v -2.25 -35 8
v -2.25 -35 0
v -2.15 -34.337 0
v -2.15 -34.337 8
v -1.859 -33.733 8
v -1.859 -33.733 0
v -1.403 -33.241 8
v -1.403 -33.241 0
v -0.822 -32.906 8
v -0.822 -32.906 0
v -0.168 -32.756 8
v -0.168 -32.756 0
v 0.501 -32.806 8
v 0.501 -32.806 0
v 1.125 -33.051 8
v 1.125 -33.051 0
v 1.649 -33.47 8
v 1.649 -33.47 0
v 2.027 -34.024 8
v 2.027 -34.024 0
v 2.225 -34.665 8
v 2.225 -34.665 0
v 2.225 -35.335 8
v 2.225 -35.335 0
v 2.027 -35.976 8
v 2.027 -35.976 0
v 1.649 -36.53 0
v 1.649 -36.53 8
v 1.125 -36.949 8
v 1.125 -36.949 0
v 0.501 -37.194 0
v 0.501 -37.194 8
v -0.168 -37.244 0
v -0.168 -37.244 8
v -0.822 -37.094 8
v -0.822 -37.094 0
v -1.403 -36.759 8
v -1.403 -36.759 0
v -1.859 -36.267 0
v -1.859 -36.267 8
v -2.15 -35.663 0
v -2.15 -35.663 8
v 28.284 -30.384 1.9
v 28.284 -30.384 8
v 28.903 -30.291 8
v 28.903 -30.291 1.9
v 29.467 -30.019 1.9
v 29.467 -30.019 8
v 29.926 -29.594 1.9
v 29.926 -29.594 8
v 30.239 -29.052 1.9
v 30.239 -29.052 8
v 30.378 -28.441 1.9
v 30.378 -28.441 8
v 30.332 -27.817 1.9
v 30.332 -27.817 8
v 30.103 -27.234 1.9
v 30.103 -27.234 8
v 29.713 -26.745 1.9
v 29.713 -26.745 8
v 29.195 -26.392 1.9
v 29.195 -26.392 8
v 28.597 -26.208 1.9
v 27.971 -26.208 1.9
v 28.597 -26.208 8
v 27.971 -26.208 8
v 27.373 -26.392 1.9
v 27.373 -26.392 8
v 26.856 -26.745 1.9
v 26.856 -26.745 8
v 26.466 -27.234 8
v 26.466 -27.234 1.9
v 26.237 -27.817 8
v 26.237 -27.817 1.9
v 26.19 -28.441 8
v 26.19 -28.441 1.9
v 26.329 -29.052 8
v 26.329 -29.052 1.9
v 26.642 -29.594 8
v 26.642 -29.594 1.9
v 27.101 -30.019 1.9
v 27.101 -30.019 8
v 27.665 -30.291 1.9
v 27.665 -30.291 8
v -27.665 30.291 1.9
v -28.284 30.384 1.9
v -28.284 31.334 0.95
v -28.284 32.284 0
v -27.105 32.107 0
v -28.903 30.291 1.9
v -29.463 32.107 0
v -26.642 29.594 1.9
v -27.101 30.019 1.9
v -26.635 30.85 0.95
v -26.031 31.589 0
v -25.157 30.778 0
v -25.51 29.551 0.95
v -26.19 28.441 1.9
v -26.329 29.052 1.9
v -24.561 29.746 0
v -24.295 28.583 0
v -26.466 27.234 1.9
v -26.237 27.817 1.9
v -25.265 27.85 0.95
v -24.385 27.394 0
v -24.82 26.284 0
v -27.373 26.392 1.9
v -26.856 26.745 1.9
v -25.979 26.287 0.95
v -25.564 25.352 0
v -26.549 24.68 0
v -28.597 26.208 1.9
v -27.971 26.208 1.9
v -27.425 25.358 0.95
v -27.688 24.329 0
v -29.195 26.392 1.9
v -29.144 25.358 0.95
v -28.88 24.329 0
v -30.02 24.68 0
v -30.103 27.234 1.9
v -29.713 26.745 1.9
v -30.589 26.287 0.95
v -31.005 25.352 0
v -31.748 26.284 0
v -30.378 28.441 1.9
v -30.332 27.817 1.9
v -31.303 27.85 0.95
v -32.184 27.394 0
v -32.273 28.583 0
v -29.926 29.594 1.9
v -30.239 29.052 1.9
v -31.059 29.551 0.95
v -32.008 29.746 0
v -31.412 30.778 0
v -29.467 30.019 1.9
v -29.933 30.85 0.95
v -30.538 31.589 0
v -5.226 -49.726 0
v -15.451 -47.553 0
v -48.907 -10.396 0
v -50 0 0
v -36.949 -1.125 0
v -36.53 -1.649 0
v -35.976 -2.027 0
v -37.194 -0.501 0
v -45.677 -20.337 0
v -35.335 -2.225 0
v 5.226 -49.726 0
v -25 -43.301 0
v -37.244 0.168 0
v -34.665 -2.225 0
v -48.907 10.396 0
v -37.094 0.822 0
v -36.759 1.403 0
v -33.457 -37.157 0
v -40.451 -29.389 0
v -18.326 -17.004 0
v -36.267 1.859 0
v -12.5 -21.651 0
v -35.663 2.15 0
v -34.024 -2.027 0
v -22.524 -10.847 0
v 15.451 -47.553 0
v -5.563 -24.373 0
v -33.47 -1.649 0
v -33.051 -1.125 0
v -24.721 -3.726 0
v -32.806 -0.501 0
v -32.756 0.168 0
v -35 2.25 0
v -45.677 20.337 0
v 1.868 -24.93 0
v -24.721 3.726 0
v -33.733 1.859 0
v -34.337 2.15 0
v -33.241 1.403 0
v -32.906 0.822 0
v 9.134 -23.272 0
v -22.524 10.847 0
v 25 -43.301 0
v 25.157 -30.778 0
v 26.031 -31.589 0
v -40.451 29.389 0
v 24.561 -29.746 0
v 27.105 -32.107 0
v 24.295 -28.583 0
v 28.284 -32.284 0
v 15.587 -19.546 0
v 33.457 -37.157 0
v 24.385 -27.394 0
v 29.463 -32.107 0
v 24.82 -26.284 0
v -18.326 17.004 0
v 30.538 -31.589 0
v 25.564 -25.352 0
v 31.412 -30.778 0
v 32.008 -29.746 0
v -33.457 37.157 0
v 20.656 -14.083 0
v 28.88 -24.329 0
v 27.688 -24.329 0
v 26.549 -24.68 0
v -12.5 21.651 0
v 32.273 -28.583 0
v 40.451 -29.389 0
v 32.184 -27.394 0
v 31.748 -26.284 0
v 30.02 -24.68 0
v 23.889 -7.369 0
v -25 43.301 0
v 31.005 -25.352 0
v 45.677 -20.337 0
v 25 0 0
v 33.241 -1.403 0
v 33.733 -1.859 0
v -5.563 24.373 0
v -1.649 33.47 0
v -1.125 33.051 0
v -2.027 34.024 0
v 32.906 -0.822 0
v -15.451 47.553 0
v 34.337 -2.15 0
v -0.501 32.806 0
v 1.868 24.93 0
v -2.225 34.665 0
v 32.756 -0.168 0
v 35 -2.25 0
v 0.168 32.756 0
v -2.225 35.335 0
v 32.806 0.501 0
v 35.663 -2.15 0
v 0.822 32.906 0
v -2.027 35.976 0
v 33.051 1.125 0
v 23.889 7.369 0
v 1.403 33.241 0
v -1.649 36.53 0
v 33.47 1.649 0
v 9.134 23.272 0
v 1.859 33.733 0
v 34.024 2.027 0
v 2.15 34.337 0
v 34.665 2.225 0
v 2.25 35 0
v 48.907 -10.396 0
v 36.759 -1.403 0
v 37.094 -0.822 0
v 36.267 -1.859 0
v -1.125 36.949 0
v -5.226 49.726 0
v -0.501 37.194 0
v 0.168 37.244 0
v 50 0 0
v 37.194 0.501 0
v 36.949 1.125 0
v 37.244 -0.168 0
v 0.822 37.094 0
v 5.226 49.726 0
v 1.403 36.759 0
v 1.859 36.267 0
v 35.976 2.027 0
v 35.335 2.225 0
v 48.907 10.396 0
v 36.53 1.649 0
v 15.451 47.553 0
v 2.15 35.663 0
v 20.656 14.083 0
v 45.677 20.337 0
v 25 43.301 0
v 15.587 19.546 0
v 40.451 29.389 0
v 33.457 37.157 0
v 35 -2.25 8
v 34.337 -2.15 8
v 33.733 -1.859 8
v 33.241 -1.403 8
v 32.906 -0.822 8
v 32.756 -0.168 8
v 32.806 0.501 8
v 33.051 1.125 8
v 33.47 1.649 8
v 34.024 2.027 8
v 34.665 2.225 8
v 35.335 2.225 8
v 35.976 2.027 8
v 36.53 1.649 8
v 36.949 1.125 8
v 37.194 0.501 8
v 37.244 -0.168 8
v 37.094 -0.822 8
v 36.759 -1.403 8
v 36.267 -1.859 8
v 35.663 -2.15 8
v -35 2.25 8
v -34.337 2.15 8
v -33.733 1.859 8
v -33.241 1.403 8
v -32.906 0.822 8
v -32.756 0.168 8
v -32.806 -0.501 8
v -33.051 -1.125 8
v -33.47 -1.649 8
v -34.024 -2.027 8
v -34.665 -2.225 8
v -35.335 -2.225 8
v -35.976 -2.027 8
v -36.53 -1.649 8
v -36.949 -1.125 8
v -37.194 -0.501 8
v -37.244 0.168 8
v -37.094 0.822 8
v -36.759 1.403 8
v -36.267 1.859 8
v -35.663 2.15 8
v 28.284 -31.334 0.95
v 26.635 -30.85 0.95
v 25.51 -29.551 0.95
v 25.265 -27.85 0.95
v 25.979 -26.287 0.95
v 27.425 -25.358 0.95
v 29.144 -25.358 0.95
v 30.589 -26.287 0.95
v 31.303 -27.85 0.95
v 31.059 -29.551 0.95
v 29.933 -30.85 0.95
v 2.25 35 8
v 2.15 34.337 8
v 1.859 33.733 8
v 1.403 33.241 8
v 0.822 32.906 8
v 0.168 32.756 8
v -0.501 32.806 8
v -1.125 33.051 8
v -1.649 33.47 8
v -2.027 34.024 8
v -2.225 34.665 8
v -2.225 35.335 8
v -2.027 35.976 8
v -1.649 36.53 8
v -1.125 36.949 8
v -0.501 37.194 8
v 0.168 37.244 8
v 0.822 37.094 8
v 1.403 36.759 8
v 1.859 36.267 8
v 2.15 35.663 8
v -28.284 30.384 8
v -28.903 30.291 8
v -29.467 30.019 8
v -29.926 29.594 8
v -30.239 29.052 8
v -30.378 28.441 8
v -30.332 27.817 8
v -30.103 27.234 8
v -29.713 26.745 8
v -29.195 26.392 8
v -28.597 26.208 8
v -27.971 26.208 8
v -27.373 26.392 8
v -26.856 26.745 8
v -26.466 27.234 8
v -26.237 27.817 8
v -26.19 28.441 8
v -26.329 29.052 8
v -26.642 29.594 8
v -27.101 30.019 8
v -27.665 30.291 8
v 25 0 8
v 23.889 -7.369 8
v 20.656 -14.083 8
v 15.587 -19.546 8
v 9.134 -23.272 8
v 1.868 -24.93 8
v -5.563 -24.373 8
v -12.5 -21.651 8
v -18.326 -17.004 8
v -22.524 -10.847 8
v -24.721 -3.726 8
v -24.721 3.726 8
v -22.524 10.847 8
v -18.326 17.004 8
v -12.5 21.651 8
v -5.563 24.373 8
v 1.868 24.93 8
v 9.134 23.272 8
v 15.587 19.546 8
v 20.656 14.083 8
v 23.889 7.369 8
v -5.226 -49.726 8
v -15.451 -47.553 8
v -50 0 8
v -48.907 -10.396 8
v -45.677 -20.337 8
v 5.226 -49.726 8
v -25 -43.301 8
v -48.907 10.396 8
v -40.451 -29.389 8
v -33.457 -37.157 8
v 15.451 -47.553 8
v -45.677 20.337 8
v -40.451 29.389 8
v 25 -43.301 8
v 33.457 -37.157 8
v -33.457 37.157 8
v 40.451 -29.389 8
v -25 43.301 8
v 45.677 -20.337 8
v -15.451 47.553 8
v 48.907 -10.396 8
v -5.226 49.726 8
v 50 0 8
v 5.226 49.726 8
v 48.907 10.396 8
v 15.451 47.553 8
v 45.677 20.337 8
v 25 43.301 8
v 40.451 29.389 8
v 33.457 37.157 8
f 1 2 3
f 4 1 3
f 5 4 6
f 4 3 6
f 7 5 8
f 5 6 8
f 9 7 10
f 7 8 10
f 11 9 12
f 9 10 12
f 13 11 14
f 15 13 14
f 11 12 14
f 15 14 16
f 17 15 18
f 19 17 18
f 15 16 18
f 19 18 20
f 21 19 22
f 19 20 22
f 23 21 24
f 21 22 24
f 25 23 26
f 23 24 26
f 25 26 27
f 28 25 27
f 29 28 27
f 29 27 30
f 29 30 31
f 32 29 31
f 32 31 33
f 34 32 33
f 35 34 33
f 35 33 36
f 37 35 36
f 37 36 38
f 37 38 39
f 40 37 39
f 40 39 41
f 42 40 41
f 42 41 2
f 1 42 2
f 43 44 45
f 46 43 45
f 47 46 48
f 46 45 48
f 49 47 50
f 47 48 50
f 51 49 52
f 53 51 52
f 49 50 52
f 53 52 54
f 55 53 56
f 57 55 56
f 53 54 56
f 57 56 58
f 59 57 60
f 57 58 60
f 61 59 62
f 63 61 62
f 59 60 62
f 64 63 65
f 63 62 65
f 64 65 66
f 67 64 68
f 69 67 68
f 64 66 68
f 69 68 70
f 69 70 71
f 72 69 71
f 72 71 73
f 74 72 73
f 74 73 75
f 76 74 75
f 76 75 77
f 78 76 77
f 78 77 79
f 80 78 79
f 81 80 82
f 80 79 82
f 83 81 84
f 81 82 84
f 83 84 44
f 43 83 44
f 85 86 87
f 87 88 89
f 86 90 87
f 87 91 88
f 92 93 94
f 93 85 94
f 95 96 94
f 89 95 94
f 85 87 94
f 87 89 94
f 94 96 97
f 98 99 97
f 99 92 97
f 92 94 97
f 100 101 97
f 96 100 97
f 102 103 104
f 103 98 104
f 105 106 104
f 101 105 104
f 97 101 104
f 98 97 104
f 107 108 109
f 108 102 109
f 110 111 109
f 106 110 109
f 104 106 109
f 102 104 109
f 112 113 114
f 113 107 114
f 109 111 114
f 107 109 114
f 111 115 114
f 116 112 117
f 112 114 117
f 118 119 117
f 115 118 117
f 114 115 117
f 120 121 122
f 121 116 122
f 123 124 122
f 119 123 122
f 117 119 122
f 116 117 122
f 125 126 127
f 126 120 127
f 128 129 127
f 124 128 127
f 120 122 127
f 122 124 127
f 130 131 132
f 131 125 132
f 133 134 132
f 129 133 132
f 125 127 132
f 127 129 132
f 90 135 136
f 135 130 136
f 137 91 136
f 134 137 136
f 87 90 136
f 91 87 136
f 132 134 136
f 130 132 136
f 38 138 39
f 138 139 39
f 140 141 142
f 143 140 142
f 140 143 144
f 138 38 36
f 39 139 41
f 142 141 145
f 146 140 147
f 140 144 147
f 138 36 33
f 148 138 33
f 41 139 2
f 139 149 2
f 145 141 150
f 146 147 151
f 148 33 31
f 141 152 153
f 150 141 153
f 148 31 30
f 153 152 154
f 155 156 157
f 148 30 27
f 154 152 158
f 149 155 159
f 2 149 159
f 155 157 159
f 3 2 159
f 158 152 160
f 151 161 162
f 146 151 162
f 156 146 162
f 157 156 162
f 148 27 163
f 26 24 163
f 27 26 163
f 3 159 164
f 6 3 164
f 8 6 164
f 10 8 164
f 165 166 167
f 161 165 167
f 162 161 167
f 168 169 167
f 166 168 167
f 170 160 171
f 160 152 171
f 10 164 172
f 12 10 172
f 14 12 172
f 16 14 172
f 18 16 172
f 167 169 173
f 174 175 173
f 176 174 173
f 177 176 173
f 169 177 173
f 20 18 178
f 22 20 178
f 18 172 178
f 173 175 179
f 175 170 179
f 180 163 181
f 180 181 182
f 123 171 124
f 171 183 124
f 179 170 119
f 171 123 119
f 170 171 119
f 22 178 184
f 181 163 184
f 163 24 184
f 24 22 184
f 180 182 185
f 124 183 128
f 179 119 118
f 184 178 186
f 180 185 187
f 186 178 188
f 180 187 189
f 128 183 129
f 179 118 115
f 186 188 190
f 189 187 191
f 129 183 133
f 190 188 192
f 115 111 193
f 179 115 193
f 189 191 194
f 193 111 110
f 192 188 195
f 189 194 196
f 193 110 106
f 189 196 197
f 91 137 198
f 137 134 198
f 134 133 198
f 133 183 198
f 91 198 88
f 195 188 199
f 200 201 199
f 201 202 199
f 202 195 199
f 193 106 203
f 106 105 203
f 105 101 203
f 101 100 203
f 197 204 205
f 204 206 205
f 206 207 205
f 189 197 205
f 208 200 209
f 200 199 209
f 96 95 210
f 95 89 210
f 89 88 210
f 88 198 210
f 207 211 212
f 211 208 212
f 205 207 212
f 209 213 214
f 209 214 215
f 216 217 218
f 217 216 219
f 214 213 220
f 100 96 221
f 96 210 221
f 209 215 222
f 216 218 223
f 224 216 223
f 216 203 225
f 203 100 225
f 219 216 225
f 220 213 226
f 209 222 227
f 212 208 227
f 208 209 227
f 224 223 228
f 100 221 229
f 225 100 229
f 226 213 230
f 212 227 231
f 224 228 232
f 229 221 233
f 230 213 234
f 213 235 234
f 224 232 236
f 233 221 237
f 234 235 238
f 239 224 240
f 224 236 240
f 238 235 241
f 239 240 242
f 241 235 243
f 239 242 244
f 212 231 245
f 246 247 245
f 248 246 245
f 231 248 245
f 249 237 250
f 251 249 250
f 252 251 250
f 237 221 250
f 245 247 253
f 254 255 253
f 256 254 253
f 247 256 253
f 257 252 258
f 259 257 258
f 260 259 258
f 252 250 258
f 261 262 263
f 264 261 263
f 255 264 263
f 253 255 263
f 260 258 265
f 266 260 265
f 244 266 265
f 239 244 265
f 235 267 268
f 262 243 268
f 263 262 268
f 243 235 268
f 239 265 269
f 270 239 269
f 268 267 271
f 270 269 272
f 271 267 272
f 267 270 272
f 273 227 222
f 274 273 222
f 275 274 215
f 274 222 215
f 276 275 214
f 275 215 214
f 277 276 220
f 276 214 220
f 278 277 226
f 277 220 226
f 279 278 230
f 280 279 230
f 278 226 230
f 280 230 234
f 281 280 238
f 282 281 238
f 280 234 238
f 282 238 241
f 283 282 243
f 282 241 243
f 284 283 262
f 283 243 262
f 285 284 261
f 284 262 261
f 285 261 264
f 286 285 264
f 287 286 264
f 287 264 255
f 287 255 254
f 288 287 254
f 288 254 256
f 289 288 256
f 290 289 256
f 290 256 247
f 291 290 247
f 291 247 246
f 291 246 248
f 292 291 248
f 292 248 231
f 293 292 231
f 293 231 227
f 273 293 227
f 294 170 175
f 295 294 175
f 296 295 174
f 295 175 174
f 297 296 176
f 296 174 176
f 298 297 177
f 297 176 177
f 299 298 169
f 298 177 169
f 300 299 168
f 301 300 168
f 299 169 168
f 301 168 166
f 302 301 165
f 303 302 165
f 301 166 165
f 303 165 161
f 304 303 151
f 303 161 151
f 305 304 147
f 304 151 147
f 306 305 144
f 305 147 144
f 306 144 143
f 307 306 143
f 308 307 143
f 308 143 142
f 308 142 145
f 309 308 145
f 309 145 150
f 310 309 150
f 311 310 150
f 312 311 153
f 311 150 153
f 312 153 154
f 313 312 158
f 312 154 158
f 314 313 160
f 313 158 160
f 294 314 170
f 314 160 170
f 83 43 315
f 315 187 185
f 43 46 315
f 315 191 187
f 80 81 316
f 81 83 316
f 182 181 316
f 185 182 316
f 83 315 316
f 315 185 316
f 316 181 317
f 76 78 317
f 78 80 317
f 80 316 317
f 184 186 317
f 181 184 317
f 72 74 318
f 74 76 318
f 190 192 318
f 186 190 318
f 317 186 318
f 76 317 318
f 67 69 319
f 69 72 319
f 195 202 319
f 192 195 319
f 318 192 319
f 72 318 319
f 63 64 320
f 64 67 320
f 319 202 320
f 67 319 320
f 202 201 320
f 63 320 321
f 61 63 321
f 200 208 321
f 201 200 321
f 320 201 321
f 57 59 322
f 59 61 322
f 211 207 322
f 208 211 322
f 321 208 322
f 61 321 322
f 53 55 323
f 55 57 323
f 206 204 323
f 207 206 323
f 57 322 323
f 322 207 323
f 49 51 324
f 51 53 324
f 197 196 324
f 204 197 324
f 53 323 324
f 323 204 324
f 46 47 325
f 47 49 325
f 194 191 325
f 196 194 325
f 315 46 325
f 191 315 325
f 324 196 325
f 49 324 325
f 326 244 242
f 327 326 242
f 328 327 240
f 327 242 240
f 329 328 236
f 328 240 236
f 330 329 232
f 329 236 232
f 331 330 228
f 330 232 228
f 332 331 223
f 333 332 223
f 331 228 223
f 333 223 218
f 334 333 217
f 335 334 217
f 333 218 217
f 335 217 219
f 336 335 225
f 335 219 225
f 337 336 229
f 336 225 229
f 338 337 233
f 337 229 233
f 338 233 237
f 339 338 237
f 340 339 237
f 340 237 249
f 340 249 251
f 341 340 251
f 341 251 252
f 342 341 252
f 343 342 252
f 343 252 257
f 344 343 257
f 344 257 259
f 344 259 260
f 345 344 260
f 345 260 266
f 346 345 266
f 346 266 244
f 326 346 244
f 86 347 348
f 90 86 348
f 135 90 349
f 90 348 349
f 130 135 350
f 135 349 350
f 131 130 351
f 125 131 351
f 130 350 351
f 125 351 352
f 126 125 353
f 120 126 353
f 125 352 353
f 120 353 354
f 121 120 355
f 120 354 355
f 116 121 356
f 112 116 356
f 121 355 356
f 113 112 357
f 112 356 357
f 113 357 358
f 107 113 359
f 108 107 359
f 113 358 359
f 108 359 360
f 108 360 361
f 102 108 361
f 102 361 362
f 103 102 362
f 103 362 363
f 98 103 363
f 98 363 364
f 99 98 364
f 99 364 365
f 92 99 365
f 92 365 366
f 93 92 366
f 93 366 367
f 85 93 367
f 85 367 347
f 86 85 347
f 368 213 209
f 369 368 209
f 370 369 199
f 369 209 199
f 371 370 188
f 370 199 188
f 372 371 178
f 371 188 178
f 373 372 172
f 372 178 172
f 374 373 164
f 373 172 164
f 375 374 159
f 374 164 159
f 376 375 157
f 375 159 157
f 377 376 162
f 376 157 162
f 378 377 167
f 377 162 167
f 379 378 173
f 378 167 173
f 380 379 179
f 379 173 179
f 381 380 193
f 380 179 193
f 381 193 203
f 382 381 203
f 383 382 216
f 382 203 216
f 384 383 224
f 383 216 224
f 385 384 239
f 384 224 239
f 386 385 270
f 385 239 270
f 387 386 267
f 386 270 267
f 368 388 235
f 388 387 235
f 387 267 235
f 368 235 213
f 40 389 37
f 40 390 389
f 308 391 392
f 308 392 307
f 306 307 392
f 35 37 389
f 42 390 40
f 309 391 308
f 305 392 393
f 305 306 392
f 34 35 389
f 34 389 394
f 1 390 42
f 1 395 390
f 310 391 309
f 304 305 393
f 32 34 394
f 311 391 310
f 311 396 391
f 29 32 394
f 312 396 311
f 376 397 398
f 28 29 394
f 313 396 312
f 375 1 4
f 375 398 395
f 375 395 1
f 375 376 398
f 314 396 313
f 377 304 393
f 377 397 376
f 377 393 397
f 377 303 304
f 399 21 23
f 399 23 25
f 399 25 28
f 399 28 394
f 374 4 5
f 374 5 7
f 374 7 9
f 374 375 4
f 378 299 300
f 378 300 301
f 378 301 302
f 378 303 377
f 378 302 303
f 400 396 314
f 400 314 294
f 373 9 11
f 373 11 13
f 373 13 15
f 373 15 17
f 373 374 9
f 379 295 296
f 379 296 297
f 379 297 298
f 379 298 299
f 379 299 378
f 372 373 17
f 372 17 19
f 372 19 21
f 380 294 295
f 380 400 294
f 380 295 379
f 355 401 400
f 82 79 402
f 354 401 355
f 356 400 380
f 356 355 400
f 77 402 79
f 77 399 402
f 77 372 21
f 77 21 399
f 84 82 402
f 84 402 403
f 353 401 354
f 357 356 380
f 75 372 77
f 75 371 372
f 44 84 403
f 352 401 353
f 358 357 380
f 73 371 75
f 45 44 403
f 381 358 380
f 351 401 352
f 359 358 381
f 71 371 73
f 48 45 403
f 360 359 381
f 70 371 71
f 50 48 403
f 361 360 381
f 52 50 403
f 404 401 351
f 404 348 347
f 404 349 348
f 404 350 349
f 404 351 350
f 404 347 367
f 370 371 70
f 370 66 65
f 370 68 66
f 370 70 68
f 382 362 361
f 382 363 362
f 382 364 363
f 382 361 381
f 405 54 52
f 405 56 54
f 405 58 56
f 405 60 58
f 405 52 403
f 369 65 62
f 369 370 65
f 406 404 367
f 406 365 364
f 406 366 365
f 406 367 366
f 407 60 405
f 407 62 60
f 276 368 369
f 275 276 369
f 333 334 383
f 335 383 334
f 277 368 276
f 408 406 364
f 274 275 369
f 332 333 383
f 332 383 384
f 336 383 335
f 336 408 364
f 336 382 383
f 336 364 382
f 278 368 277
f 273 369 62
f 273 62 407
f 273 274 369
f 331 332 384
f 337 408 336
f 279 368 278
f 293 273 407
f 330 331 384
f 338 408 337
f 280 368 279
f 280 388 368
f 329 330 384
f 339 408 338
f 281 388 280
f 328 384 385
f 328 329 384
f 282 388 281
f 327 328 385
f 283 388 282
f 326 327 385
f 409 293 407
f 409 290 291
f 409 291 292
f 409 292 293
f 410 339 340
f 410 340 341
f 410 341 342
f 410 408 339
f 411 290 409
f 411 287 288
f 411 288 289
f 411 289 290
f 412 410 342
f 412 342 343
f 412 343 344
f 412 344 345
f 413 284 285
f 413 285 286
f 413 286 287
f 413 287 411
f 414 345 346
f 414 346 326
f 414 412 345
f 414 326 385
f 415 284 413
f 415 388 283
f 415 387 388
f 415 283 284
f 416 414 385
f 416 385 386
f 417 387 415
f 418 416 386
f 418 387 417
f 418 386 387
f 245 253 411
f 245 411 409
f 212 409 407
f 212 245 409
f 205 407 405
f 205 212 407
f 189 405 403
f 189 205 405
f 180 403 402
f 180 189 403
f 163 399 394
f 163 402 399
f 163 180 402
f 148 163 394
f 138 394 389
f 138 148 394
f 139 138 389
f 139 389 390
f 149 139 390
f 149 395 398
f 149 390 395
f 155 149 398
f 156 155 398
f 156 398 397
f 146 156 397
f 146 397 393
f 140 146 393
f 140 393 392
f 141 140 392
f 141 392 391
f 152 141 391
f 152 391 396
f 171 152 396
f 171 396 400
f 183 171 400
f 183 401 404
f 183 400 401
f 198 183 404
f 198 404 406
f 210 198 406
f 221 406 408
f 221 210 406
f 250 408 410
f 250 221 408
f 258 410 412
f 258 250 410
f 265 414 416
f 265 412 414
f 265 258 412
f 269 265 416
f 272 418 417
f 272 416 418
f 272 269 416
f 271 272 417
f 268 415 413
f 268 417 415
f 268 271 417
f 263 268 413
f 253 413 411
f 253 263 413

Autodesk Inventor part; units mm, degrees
ref_plane "YZ Plane" through (0, 0, 0) normal (1, 0, 0) x (0, 1, 0)
ref_plane "XZ Plane" through (0, 0, 0) normal (0, 1, 0) x (-1, 0, 0)
ref_plane "XY Plane" through (0, 0, 0) normal (0, 0, 1) x (1, 0, 0)
sketch "Sketch2" plane through (0, 0, 0) normal (0, 0, 1) x (1, 0, 0)
  circle A0 centre (0, 0) radius 25
  circle A1 centre (0, 0) radius 50
  dimension "d11" = 100
  dimension "d12" = 50
extrude "Extrusion2" add sketch "Sketch2" along normal blind 8
sketch "Sketch3" plane through (0, 0, 8) normal (0, 0, 1) x (1, 0, 0)
  point P0 (0, 0)
  point P1 (35, 0)
  dimension "d15" = 35
hole "Hole1" at (35, 0, 8) direction (0, 0, -1) diameter 4.5 depth 8 tip angle 118
pattern_circular "Circular Pattern1" count 4 over 360 about axis through (0, 0, 0) along (0, 0, 1) of "Hole1"
sketch "Sketch4" plane through (0, 0, 0) normal (0, 0, -1) x (-1, 0, 0)
  line L0 (0, 0) -> (28.2843, 28.2843)
  line L1 (0, 0) -> (17.6035, 0)
  dimension "d26" = 45
  dimension "d27" = 40
hole "Hole2" at (-28.2843, 28.2843, 0) direction (0, 0, 1) diameter 4.2 depth 8 tip angle 118 countersink diameter 8 countersink angle 90
pattern_circular "Circular Pattern2" count 2 over 360 about axis through (0, 0, 0) along (0, 0, 1) of "Hole2"
properties part number "M20 - Flange Connector" material "ABS Plastic"
